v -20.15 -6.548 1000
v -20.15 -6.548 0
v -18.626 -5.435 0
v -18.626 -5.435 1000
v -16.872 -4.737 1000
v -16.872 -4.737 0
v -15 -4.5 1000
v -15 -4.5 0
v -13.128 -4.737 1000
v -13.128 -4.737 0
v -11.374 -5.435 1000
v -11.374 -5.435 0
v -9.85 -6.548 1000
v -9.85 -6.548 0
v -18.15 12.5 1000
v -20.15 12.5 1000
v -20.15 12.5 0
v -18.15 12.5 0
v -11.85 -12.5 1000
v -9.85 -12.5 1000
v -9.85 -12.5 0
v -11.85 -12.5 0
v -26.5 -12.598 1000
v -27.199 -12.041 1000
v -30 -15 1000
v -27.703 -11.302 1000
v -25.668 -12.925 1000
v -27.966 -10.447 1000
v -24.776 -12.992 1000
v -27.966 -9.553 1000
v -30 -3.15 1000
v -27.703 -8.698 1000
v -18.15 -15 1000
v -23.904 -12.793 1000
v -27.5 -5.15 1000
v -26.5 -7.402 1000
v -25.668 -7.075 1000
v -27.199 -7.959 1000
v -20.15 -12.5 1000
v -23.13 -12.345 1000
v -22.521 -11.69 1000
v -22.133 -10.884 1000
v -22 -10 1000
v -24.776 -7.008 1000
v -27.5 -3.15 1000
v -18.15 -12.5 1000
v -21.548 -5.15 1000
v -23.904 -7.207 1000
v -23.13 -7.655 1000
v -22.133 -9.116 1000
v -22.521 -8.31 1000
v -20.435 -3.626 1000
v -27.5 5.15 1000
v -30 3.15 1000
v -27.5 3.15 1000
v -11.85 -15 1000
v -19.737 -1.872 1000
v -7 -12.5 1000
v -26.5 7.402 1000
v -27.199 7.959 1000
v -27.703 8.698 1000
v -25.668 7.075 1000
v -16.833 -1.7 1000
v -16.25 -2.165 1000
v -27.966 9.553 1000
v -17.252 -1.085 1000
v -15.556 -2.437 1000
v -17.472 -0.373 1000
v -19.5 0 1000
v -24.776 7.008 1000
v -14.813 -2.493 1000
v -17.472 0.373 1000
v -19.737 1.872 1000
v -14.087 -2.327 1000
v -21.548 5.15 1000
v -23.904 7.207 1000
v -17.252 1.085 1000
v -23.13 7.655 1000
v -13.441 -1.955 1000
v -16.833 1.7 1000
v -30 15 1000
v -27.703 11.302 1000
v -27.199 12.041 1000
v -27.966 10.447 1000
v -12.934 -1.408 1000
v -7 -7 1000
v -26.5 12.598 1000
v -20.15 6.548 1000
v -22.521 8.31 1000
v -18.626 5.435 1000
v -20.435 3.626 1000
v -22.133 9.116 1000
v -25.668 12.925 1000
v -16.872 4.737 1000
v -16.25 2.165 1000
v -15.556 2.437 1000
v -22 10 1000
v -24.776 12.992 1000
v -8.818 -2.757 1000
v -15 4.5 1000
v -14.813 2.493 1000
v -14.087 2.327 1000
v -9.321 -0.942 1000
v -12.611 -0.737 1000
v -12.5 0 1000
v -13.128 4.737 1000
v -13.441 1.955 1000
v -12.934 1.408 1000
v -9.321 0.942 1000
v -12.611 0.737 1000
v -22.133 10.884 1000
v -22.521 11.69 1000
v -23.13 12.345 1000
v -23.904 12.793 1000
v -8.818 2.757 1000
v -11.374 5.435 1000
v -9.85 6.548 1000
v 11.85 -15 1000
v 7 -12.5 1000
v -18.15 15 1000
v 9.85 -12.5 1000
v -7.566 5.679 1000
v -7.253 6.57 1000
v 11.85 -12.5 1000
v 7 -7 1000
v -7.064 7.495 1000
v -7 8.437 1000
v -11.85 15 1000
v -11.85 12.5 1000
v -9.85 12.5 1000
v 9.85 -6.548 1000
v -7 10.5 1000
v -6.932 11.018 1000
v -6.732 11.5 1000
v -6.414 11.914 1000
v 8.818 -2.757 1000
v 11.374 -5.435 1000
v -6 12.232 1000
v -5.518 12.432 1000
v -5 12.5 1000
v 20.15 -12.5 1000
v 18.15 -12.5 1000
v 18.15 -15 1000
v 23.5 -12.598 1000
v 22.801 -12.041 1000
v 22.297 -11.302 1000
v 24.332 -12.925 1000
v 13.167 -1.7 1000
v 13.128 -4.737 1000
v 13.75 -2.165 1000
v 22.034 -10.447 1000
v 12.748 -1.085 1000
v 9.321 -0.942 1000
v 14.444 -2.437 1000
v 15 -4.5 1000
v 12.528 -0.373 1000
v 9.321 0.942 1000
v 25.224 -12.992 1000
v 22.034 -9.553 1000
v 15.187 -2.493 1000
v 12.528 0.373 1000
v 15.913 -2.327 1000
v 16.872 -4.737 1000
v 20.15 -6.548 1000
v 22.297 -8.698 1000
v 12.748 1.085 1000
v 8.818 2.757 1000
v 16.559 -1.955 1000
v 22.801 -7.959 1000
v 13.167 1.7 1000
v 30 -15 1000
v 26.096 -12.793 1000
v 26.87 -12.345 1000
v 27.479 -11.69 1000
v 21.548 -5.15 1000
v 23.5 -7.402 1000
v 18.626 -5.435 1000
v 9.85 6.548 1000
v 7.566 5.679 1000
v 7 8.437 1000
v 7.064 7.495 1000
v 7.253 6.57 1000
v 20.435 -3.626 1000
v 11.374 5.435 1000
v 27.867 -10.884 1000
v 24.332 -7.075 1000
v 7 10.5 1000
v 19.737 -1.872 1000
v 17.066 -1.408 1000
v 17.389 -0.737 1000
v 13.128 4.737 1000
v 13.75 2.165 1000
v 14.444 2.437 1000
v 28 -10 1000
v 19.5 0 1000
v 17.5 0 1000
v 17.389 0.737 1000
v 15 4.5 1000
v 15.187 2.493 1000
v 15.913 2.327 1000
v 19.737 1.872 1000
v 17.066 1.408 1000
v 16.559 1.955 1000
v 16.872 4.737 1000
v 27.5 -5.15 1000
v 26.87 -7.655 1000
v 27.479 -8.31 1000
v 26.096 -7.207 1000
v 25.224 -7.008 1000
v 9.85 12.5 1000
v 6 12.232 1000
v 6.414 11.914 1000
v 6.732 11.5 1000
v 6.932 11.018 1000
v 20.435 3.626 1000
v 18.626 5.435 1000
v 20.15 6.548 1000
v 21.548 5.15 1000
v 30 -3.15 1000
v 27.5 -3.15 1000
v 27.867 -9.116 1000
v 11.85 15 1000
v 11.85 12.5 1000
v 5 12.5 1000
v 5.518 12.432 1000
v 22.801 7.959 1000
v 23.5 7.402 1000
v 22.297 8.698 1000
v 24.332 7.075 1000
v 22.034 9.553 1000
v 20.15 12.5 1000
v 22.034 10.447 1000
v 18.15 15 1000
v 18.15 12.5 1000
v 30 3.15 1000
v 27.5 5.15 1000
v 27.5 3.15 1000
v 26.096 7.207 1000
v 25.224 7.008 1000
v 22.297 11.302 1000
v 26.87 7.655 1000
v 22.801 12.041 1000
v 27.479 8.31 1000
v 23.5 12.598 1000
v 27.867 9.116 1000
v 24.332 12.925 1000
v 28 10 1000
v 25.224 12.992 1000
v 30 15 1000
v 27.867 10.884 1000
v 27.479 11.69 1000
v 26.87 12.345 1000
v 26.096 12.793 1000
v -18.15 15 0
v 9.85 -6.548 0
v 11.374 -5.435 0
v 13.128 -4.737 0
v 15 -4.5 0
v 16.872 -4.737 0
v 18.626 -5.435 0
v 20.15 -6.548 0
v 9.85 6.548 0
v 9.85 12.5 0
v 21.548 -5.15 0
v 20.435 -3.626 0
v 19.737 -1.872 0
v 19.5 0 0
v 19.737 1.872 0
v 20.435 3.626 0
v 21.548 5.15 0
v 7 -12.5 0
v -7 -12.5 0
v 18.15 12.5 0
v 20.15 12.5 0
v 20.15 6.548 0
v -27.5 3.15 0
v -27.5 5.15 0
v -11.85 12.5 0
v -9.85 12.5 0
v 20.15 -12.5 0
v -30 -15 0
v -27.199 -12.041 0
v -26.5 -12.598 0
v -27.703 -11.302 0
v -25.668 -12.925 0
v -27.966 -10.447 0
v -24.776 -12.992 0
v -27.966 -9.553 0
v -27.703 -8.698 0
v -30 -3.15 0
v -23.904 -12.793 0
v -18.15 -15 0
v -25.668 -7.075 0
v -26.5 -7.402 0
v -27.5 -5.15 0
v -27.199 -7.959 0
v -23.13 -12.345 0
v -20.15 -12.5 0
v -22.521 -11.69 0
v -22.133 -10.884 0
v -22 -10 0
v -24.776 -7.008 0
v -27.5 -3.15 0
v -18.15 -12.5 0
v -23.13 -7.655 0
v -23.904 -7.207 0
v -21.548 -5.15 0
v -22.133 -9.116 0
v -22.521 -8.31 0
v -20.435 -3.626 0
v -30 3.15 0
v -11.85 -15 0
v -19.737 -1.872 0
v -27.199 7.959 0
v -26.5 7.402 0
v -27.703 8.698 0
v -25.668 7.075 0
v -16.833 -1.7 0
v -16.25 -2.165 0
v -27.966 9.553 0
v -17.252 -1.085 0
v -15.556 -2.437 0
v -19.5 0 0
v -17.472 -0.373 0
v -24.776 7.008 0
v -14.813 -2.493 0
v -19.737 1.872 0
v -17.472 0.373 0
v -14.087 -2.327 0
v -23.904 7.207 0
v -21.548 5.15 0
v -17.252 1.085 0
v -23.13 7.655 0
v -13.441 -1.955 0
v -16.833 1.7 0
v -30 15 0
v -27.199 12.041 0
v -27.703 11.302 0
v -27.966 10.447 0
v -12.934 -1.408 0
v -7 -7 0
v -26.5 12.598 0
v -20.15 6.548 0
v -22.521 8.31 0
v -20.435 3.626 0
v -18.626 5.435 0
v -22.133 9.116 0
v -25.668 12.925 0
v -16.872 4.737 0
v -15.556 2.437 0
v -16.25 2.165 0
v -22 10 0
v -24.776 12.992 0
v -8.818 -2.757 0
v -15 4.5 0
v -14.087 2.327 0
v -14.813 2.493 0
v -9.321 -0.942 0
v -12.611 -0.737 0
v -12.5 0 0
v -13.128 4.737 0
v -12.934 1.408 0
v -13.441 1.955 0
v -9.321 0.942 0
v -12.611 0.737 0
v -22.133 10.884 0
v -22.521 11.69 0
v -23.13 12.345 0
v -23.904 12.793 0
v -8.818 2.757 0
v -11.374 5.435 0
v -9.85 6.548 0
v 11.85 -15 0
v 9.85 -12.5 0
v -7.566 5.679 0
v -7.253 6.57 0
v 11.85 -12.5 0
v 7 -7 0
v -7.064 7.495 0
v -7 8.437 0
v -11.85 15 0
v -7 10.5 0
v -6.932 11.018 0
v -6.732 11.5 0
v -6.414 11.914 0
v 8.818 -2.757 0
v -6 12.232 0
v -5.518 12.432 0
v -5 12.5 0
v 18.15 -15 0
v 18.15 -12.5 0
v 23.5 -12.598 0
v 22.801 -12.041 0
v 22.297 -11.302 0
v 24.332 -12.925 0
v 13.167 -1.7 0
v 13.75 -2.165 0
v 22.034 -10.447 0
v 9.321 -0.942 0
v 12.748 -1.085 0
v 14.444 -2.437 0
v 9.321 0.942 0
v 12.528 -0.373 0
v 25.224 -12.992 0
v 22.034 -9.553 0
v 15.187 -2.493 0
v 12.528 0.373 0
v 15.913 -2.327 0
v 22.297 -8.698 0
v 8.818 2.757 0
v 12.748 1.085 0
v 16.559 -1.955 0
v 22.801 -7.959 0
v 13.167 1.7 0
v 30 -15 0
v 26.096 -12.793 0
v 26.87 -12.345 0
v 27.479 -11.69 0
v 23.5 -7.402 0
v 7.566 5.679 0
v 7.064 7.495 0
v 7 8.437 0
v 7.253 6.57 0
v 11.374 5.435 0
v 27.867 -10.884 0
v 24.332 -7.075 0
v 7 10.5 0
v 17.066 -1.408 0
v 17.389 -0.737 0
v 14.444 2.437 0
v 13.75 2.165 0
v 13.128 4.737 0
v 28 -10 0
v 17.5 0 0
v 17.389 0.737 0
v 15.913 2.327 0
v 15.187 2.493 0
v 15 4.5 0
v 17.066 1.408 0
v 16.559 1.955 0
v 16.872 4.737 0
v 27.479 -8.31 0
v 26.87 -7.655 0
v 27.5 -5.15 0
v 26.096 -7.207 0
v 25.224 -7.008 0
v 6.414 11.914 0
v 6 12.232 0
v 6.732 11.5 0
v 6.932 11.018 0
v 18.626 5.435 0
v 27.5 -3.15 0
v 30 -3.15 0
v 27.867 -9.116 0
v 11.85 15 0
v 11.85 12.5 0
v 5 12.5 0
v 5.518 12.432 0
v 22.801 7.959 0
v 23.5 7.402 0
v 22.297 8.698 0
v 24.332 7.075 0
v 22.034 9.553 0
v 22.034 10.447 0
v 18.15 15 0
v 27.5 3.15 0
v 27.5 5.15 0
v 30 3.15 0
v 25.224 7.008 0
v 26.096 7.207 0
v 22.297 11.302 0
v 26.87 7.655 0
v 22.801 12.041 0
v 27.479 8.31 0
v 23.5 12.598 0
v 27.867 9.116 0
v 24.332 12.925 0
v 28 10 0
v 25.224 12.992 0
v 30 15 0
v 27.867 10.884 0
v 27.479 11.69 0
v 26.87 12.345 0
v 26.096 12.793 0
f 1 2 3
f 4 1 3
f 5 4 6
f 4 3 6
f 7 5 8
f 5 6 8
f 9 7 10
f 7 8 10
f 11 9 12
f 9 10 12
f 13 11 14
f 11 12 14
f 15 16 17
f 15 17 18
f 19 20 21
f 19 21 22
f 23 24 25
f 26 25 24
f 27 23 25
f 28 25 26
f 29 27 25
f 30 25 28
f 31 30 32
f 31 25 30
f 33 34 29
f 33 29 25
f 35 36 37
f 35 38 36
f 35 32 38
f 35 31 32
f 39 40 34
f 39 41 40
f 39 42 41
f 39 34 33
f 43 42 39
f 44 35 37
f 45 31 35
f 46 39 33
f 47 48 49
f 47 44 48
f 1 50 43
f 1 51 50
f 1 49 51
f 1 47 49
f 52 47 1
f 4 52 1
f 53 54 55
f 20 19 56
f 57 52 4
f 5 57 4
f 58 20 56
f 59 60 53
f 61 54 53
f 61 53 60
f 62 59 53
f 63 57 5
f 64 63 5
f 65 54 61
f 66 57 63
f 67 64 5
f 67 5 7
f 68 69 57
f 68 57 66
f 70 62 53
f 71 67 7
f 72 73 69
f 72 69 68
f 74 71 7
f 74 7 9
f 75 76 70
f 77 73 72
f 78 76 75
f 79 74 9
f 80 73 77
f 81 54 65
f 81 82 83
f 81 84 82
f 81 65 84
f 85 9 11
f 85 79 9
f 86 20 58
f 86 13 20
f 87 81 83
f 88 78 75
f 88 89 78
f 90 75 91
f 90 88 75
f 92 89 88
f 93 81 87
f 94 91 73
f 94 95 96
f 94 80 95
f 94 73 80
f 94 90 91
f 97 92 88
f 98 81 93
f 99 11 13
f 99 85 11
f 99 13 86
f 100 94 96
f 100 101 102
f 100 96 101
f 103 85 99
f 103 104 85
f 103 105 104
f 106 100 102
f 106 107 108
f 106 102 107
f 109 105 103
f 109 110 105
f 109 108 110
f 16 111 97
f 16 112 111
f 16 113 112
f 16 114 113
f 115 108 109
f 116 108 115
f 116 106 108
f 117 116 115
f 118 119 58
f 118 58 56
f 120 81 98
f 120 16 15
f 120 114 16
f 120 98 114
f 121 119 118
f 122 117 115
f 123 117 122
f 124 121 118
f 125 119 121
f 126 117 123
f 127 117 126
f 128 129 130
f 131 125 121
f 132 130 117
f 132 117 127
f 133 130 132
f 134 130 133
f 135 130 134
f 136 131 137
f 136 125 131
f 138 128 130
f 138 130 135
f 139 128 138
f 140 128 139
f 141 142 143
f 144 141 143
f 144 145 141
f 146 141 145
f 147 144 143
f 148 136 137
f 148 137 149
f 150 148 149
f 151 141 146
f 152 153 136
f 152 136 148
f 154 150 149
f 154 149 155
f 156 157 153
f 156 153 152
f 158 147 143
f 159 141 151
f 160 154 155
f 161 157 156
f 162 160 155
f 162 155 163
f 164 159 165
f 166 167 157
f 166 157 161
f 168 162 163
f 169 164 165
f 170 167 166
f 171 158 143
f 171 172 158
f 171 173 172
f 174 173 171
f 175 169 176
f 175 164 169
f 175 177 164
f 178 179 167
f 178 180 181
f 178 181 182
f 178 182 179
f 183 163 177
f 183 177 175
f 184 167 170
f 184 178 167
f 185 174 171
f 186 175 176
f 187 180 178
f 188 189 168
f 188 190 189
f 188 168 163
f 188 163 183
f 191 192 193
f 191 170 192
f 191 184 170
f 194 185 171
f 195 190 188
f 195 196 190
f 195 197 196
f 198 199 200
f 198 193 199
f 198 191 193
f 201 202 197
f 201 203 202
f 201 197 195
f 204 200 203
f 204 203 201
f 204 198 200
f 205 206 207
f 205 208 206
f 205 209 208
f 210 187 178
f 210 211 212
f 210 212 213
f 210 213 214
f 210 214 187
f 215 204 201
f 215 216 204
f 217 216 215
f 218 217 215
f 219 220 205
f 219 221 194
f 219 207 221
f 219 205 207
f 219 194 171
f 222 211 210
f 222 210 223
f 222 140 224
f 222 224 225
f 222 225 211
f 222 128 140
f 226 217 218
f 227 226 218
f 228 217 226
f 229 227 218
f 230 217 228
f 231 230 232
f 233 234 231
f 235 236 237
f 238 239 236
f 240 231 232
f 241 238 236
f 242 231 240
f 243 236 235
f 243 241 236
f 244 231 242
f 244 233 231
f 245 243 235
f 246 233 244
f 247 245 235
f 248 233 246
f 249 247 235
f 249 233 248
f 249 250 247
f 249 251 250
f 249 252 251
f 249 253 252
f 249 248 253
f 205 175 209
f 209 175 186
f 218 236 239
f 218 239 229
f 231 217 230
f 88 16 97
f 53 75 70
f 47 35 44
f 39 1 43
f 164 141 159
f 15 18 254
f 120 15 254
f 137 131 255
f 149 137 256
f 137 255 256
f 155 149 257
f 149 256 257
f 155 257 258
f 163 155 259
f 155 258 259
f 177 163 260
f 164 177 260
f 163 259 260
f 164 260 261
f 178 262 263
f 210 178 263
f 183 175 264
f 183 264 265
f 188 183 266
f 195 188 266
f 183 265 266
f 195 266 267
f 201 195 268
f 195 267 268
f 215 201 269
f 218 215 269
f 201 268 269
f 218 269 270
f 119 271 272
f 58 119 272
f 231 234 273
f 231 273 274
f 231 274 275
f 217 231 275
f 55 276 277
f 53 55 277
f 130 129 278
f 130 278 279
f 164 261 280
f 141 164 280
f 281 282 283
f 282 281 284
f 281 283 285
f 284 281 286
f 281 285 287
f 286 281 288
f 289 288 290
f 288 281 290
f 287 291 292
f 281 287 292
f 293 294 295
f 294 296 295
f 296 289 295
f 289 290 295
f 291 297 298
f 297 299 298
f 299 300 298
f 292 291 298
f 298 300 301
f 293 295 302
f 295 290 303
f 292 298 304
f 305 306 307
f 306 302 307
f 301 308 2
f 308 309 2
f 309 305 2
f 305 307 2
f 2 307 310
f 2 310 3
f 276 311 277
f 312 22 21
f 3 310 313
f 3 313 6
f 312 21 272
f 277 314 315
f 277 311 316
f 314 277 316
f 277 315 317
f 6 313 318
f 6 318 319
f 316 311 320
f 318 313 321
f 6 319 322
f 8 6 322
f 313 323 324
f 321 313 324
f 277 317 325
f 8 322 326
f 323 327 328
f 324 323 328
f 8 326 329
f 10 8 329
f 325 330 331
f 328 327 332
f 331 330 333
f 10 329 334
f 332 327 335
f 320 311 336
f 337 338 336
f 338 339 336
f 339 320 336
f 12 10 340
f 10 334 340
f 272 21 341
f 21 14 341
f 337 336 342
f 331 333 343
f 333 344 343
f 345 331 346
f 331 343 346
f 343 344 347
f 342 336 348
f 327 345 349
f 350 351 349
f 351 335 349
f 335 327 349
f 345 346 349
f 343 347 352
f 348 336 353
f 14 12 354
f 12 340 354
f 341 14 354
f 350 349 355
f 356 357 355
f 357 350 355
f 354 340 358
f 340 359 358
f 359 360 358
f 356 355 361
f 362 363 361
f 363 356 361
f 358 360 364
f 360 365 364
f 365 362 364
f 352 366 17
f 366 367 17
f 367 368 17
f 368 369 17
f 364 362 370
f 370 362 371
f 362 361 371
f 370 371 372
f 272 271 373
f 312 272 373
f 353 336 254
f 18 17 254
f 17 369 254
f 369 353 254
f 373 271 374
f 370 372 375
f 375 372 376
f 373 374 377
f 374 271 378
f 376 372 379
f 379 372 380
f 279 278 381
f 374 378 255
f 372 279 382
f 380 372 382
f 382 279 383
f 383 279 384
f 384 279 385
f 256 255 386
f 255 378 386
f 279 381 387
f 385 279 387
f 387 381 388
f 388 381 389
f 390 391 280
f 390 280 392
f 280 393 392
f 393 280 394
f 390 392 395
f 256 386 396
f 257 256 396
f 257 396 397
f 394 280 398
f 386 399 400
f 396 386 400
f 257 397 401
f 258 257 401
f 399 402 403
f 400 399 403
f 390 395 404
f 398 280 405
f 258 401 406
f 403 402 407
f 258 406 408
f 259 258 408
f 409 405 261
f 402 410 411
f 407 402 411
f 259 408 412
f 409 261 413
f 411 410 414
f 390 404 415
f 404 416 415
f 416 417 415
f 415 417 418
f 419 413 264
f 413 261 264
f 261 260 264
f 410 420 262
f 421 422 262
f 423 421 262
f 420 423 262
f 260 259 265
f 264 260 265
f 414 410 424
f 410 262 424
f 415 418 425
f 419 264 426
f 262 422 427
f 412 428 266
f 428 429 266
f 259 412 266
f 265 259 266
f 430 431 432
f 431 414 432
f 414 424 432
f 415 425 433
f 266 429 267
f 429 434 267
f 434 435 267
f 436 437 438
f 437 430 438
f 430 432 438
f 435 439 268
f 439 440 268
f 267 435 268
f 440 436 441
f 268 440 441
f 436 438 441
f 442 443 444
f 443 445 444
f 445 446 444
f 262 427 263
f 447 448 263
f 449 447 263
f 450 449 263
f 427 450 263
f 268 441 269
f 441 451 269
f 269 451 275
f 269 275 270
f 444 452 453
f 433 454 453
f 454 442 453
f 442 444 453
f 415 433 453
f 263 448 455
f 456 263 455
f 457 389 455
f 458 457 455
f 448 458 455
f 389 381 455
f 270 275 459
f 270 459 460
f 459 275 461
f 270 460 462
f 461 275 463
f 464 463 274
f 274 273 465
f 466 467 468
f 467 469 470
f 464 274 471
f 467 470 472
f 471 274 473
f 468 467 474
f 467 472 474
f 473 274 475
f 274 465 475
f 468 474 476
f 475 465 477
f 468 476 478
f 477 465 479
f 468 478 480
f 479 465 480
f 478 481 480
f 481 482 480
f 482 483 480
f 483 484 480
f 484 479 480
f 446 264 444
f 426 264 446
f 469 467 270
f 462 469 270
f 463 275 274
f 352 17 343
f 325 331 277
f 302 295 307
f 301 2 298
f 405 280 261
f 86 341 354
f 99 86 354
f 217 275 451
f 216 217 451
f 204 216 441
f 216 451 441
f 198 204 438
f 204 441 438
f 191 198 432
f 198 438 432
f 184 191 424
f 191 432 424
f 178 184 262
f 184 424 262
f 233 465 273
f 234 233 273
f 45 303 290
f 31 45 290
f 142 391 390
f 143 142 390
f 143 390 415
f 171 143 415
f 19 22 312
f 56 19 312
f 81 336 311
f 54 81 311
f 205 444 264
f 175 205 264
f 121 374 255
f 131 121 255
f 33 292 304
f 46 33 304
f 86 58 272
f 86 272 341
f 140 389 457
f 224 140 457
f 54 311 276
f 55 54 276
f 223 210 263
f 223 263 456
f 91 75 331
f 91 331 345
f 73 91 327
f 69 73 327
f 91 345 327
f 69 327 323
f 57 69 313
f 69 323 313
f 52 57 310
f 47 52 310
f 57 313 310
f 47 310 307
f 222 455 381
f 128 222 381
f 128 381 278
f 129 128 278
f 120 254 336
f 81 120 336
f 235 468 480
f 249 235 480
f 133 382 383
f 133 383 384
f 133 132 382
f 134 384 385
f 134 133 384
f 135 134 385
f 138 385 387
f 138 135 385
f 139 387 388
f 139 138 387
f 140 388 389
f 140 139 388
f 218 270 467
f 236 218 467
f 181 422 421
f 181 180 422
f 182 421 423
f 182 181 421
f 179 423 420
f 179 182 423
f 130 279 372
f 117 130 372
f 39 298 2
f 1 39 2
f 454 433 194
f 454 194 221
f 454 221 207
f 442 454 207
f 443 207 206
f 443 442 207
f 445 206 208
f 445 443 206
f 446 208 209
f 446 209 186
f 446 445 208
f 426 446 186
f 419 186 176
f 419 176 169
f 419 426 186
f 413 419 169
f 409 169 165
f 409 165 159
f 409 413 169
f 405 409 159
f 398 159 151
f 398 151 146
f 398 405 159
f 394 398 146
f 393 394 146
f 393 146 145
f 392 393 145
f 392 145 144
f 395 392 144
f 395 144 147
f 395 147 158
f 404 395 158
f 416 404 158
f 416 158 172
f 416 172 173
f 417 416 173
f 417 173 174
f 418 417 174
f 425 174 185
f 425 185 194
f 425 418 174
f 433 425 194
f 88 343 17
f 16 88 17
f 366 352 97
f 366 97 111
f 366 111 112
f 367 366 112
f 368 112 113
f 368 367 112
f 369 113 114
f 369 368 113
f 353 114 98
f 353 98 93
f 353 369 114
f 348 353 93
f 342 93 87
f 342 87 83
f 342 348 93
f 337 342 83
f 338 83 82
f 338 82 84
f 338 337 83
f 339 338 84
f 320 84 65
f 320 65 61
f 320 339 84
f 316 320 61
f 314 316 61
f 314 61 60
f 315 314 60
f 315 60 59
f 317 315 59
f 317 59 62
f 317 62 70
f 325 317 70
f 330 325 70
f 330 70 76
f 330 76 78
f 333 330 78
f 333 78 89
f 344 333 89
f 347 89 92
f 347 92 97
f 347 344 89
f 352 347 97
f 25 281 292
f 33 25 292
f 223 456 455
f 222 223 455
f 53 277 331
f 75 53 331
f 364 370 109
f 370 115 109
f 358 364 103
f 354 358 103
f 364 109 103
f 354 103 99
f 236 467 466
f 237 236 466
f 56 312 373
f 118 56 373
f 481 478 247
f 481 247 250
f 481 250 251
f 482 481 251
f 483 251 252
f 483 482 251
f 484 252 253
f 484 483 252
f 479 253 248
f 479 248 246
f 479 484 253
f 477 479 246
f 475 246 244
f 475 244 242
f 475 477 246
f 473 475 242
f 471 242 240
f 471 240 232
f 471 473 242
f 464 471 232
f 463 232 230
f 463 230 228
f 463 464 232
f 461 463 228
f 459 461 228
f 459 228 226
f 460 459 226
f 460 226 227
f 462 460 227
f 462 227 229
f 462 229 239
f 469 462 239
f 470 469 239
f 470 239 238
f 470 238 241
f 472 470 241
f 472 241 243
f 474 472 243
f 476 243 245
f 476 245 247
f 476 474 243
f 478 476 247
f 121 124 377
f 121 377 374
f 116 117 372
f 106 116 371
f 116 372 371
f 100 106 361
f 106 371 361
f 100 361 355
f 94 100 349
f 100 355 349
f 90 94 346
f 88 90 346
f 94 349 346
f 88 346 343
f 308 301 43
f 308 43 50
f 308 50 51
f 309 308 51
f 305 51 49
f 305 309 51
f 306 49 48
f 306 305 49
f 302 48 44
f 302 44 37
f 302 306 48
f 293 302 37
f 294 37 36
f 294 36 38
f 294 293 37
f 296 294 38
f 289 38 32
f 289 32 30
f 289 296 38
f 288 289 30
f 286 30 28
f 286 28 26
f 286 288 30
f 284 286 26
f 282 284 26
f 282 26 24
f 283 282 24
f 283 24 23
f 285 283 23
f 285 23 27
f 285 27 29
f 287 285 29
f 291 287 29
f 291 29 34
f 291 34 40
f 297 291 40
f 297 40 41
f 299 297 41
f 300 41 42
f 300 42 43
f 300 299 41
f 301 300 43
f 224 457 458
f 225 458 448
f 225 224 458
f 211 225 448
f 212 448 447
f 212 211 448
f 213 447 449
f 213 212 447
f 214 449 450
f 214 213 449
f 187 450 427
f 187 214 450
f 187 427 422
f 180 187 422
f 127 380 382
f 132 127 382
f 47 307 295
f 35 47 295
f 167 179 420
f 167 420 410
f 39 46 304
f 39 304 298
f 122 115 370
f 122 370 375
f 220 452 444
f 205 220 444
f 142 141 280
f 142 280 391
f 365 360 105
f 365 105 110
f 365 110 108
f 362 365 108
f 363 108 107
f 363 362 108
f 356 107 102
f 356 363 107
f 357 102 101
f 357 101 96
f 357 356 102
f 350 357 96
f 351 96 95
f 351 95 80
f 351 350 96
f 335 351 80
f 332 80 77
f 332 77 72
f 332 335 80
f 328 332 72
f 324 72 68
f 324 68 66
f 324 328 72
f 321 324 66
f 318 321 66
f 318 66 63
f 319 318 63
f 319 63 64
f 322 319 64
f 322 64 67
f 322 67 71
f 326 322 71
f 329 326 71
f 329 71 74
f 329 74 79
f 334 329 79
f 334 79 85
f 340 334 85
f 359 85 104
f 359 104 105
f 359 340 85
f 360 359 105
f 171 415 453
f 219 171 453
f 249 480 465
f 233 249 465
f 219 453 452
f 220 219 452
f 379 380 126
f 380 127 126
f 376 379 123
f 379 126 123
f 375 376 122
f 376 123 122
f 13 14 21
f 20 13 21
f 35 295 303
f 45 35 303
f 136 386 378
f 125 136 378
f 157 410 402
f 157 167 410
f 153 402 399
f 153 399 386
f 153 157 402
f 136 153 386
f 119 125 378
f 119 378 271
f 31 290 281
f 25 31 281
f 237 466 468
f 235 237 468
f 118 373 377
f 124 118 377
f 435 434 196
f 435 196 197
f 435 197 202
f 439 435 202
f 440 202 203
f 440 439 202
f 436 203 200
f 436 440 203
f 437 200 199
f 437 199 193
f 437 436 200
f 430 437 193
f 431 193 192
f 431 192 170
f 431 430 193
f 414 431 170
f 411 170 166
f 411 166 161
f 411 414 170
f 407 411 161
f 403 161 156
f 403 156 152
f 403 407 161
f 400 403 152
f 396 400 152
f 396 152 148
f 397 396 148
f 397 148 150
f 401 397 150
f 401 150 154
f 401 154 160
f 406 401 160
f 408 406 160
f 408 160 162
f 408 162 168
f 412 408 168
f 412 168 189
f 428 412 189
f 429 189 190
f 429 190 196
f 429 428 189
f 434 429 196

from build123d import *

# Parameters (mm, degrees)
F0_R     = 3
F0_R_2   = 2.5
F1_DEPTH = 1000
F2_R     = 2
F3_R     = 7


# Not quite as in the source:
# - a feature names something its author has since deleted; it is built from what else it names


with BuildPart() as f1:
    # F0 (on Top) → F1 (new body)
    with BuildSketch(Plane.XY):
        with BuildLine():
            Line((18.15, -15), (30, -15))
            Line((30, -15), (30, -3.15))
            Line((30, -3.15), (27.5, -3.15))
            Line((27.5, -3.15), (27.5, -5.15))
            Line((27.5, -5.15), (21.5477069044, -5.15))
            ThreePointArc((21.5477069044, -5.15), (19.5, 0), (21.5477069044, 5.15))
            Line((21.5477069044, 5.15), (27.5, 5.15))
            Line((27.5, 5.15), (27.5, 3.15))
            Line((27.5, 3.15), (30, 3.15))
            Line((30, 3.15), (30, 15))
            Line((30, 15), (18.15, 15))
            Line((18.15, 15), (18.15, 12.5))
            Line((18.15, 12.5), (20.15, 12.5))
            Line((20.15, 12.5), (20.15, 6.5477069044))
            ThreePointArc((20.15, 6.5477069044), (15, 4.5), (9.85, 6.5477069044))
            Line((9.85, 6.5477069044), (9.85, 12.5))
            Line((9.85, 12.5), (11.85, 12.5))
            Line((11.85, 12.5), (11.85, 15))
            Line((11.85, 15), (-11.85, 15))
            Line((-11.85, 15), (-11.85, 12.5))
            Line((-11.85, 12.5), (-9.85, 12.5))
            Line((-9.85, 12.5), (-9.85, 6.5477069044))
            ThreePointArc((-9.85, 6.5477069044), (-15, 4.5), (-20.15, 6.5477069044))
            Line((-20.15, 6.5477069044), (-20.15, 12.5))
            Line((-20.15, 12.5), (-18.15, 12.5))
            Line((-18.15, 12.5), (-18.15, 15))
            Line((-18.15, 15), (-30, 15))
            Line((-30, 15), (-30, 3.15))
            Line((-30, 3.15), (-27.5, 3.15))
            Line((-27.5, 3.15), (-27.5, 5.15))
            Line((-27.5, 5.15), (-21.5477069044, 5.15))
            ThreePointArc((-21.5477069044, 5.15), (-19.5, 0), (-21.5477069044, -5.15))
            Line((-21.5477069044, -5.15), (-27.5, -5.15))
            Line((-27.5, -5.15), (-27.5, -3.15))
            Line((-27.5, -3.15), (-30, -3.15))
            Line((-30, -3.15), (-30, -15))
            Line((-30, -15), (-18.15, -15))
            Line((-18.15, -15), (-18.15, -12.5))
            Line((-18.15, -12.5), (-20.15, -12.5))
            Line((-20.15, -12.5), (-20.15, -6.5477069044))
            ThreePointArc((-20.15, -6.5477069044), (-15, -4.5), (-9.85, -6.5477069044))
            Line((-9.85, -6.5477069044), (-9.85, -12.5))
            Line((-9.85, -12.5), (-11.85, -12.5))
            Line((-11.85, -12.5), (-11.85, -15))
            Line((-11.85, -15), (11.85, -15))
            Line((11.85, -15), (11.85, -12.5))
            Line((11.85, -12.5), (9.85, -12.5))
            Line((9.85, -12.5), (9.85, -6.5477069044))
            ThreePointArc((9.85, -6.5477069044), (15, -4.5), (20.15, -6.5477069044))
            Line((20.15, -6.5477069044), (20.15, -12.5))
            Line((20.15, -12.5), (18.15, -12.5))
            Line((18.15, -12.5), (18.15, -15))
        make_face()
        with Locations((-25, -10)):
            Circle(F0_R, mode=Mode.SUBTRACT)
        with Locations((25, -10)):
            Circle(F0_R, mode=Mode.SUBTRACT)
        with Locations((-15, 0)):
            Circle(F0_R_2, mode=Mode.SUBTRACT)
        with Locations((-25, 10)):
            Circle(F0_R, mode=Mode.SUBTRACT)
        Polygon((-7, 7), (-7, 12.5), (0, 12.5), (7, 12.5), (7, 7), (10, 0), (7, -7), (7, -12.5), (0, -12.5), (-7, -12.5), (-7, -7), (-10, 0), align=None, mode=Mode.SUBTRACT)
        with Locations((15, 0)):
            Circle(F0_R_2, mode=Mode.SUBTRACT)
        with Locations((25, 10)):
            Circle(F0_R, mode=Mode.SUBTRACT)
    extrude(amount=F1_DEPTH)

    # F2
    f2_edges = [f1.edges().sort_by_distance(p)[0] for p in [
        (-7, 12.5, 500),
        (7, 12.5, 500),
    ]]
    fillet(f2_edges, radius=F2_R)

    # F3
    f3_edges = [f1.edges().sort_by_distance(p)[0] for p in [
        (-7, 7, 500),
        (-10, 0, 500),
        (7, 7, 500),
        (10, 0, 500),
    ]]
    fillet(f3_edges, radius=F3_R)


solid = f1.part
